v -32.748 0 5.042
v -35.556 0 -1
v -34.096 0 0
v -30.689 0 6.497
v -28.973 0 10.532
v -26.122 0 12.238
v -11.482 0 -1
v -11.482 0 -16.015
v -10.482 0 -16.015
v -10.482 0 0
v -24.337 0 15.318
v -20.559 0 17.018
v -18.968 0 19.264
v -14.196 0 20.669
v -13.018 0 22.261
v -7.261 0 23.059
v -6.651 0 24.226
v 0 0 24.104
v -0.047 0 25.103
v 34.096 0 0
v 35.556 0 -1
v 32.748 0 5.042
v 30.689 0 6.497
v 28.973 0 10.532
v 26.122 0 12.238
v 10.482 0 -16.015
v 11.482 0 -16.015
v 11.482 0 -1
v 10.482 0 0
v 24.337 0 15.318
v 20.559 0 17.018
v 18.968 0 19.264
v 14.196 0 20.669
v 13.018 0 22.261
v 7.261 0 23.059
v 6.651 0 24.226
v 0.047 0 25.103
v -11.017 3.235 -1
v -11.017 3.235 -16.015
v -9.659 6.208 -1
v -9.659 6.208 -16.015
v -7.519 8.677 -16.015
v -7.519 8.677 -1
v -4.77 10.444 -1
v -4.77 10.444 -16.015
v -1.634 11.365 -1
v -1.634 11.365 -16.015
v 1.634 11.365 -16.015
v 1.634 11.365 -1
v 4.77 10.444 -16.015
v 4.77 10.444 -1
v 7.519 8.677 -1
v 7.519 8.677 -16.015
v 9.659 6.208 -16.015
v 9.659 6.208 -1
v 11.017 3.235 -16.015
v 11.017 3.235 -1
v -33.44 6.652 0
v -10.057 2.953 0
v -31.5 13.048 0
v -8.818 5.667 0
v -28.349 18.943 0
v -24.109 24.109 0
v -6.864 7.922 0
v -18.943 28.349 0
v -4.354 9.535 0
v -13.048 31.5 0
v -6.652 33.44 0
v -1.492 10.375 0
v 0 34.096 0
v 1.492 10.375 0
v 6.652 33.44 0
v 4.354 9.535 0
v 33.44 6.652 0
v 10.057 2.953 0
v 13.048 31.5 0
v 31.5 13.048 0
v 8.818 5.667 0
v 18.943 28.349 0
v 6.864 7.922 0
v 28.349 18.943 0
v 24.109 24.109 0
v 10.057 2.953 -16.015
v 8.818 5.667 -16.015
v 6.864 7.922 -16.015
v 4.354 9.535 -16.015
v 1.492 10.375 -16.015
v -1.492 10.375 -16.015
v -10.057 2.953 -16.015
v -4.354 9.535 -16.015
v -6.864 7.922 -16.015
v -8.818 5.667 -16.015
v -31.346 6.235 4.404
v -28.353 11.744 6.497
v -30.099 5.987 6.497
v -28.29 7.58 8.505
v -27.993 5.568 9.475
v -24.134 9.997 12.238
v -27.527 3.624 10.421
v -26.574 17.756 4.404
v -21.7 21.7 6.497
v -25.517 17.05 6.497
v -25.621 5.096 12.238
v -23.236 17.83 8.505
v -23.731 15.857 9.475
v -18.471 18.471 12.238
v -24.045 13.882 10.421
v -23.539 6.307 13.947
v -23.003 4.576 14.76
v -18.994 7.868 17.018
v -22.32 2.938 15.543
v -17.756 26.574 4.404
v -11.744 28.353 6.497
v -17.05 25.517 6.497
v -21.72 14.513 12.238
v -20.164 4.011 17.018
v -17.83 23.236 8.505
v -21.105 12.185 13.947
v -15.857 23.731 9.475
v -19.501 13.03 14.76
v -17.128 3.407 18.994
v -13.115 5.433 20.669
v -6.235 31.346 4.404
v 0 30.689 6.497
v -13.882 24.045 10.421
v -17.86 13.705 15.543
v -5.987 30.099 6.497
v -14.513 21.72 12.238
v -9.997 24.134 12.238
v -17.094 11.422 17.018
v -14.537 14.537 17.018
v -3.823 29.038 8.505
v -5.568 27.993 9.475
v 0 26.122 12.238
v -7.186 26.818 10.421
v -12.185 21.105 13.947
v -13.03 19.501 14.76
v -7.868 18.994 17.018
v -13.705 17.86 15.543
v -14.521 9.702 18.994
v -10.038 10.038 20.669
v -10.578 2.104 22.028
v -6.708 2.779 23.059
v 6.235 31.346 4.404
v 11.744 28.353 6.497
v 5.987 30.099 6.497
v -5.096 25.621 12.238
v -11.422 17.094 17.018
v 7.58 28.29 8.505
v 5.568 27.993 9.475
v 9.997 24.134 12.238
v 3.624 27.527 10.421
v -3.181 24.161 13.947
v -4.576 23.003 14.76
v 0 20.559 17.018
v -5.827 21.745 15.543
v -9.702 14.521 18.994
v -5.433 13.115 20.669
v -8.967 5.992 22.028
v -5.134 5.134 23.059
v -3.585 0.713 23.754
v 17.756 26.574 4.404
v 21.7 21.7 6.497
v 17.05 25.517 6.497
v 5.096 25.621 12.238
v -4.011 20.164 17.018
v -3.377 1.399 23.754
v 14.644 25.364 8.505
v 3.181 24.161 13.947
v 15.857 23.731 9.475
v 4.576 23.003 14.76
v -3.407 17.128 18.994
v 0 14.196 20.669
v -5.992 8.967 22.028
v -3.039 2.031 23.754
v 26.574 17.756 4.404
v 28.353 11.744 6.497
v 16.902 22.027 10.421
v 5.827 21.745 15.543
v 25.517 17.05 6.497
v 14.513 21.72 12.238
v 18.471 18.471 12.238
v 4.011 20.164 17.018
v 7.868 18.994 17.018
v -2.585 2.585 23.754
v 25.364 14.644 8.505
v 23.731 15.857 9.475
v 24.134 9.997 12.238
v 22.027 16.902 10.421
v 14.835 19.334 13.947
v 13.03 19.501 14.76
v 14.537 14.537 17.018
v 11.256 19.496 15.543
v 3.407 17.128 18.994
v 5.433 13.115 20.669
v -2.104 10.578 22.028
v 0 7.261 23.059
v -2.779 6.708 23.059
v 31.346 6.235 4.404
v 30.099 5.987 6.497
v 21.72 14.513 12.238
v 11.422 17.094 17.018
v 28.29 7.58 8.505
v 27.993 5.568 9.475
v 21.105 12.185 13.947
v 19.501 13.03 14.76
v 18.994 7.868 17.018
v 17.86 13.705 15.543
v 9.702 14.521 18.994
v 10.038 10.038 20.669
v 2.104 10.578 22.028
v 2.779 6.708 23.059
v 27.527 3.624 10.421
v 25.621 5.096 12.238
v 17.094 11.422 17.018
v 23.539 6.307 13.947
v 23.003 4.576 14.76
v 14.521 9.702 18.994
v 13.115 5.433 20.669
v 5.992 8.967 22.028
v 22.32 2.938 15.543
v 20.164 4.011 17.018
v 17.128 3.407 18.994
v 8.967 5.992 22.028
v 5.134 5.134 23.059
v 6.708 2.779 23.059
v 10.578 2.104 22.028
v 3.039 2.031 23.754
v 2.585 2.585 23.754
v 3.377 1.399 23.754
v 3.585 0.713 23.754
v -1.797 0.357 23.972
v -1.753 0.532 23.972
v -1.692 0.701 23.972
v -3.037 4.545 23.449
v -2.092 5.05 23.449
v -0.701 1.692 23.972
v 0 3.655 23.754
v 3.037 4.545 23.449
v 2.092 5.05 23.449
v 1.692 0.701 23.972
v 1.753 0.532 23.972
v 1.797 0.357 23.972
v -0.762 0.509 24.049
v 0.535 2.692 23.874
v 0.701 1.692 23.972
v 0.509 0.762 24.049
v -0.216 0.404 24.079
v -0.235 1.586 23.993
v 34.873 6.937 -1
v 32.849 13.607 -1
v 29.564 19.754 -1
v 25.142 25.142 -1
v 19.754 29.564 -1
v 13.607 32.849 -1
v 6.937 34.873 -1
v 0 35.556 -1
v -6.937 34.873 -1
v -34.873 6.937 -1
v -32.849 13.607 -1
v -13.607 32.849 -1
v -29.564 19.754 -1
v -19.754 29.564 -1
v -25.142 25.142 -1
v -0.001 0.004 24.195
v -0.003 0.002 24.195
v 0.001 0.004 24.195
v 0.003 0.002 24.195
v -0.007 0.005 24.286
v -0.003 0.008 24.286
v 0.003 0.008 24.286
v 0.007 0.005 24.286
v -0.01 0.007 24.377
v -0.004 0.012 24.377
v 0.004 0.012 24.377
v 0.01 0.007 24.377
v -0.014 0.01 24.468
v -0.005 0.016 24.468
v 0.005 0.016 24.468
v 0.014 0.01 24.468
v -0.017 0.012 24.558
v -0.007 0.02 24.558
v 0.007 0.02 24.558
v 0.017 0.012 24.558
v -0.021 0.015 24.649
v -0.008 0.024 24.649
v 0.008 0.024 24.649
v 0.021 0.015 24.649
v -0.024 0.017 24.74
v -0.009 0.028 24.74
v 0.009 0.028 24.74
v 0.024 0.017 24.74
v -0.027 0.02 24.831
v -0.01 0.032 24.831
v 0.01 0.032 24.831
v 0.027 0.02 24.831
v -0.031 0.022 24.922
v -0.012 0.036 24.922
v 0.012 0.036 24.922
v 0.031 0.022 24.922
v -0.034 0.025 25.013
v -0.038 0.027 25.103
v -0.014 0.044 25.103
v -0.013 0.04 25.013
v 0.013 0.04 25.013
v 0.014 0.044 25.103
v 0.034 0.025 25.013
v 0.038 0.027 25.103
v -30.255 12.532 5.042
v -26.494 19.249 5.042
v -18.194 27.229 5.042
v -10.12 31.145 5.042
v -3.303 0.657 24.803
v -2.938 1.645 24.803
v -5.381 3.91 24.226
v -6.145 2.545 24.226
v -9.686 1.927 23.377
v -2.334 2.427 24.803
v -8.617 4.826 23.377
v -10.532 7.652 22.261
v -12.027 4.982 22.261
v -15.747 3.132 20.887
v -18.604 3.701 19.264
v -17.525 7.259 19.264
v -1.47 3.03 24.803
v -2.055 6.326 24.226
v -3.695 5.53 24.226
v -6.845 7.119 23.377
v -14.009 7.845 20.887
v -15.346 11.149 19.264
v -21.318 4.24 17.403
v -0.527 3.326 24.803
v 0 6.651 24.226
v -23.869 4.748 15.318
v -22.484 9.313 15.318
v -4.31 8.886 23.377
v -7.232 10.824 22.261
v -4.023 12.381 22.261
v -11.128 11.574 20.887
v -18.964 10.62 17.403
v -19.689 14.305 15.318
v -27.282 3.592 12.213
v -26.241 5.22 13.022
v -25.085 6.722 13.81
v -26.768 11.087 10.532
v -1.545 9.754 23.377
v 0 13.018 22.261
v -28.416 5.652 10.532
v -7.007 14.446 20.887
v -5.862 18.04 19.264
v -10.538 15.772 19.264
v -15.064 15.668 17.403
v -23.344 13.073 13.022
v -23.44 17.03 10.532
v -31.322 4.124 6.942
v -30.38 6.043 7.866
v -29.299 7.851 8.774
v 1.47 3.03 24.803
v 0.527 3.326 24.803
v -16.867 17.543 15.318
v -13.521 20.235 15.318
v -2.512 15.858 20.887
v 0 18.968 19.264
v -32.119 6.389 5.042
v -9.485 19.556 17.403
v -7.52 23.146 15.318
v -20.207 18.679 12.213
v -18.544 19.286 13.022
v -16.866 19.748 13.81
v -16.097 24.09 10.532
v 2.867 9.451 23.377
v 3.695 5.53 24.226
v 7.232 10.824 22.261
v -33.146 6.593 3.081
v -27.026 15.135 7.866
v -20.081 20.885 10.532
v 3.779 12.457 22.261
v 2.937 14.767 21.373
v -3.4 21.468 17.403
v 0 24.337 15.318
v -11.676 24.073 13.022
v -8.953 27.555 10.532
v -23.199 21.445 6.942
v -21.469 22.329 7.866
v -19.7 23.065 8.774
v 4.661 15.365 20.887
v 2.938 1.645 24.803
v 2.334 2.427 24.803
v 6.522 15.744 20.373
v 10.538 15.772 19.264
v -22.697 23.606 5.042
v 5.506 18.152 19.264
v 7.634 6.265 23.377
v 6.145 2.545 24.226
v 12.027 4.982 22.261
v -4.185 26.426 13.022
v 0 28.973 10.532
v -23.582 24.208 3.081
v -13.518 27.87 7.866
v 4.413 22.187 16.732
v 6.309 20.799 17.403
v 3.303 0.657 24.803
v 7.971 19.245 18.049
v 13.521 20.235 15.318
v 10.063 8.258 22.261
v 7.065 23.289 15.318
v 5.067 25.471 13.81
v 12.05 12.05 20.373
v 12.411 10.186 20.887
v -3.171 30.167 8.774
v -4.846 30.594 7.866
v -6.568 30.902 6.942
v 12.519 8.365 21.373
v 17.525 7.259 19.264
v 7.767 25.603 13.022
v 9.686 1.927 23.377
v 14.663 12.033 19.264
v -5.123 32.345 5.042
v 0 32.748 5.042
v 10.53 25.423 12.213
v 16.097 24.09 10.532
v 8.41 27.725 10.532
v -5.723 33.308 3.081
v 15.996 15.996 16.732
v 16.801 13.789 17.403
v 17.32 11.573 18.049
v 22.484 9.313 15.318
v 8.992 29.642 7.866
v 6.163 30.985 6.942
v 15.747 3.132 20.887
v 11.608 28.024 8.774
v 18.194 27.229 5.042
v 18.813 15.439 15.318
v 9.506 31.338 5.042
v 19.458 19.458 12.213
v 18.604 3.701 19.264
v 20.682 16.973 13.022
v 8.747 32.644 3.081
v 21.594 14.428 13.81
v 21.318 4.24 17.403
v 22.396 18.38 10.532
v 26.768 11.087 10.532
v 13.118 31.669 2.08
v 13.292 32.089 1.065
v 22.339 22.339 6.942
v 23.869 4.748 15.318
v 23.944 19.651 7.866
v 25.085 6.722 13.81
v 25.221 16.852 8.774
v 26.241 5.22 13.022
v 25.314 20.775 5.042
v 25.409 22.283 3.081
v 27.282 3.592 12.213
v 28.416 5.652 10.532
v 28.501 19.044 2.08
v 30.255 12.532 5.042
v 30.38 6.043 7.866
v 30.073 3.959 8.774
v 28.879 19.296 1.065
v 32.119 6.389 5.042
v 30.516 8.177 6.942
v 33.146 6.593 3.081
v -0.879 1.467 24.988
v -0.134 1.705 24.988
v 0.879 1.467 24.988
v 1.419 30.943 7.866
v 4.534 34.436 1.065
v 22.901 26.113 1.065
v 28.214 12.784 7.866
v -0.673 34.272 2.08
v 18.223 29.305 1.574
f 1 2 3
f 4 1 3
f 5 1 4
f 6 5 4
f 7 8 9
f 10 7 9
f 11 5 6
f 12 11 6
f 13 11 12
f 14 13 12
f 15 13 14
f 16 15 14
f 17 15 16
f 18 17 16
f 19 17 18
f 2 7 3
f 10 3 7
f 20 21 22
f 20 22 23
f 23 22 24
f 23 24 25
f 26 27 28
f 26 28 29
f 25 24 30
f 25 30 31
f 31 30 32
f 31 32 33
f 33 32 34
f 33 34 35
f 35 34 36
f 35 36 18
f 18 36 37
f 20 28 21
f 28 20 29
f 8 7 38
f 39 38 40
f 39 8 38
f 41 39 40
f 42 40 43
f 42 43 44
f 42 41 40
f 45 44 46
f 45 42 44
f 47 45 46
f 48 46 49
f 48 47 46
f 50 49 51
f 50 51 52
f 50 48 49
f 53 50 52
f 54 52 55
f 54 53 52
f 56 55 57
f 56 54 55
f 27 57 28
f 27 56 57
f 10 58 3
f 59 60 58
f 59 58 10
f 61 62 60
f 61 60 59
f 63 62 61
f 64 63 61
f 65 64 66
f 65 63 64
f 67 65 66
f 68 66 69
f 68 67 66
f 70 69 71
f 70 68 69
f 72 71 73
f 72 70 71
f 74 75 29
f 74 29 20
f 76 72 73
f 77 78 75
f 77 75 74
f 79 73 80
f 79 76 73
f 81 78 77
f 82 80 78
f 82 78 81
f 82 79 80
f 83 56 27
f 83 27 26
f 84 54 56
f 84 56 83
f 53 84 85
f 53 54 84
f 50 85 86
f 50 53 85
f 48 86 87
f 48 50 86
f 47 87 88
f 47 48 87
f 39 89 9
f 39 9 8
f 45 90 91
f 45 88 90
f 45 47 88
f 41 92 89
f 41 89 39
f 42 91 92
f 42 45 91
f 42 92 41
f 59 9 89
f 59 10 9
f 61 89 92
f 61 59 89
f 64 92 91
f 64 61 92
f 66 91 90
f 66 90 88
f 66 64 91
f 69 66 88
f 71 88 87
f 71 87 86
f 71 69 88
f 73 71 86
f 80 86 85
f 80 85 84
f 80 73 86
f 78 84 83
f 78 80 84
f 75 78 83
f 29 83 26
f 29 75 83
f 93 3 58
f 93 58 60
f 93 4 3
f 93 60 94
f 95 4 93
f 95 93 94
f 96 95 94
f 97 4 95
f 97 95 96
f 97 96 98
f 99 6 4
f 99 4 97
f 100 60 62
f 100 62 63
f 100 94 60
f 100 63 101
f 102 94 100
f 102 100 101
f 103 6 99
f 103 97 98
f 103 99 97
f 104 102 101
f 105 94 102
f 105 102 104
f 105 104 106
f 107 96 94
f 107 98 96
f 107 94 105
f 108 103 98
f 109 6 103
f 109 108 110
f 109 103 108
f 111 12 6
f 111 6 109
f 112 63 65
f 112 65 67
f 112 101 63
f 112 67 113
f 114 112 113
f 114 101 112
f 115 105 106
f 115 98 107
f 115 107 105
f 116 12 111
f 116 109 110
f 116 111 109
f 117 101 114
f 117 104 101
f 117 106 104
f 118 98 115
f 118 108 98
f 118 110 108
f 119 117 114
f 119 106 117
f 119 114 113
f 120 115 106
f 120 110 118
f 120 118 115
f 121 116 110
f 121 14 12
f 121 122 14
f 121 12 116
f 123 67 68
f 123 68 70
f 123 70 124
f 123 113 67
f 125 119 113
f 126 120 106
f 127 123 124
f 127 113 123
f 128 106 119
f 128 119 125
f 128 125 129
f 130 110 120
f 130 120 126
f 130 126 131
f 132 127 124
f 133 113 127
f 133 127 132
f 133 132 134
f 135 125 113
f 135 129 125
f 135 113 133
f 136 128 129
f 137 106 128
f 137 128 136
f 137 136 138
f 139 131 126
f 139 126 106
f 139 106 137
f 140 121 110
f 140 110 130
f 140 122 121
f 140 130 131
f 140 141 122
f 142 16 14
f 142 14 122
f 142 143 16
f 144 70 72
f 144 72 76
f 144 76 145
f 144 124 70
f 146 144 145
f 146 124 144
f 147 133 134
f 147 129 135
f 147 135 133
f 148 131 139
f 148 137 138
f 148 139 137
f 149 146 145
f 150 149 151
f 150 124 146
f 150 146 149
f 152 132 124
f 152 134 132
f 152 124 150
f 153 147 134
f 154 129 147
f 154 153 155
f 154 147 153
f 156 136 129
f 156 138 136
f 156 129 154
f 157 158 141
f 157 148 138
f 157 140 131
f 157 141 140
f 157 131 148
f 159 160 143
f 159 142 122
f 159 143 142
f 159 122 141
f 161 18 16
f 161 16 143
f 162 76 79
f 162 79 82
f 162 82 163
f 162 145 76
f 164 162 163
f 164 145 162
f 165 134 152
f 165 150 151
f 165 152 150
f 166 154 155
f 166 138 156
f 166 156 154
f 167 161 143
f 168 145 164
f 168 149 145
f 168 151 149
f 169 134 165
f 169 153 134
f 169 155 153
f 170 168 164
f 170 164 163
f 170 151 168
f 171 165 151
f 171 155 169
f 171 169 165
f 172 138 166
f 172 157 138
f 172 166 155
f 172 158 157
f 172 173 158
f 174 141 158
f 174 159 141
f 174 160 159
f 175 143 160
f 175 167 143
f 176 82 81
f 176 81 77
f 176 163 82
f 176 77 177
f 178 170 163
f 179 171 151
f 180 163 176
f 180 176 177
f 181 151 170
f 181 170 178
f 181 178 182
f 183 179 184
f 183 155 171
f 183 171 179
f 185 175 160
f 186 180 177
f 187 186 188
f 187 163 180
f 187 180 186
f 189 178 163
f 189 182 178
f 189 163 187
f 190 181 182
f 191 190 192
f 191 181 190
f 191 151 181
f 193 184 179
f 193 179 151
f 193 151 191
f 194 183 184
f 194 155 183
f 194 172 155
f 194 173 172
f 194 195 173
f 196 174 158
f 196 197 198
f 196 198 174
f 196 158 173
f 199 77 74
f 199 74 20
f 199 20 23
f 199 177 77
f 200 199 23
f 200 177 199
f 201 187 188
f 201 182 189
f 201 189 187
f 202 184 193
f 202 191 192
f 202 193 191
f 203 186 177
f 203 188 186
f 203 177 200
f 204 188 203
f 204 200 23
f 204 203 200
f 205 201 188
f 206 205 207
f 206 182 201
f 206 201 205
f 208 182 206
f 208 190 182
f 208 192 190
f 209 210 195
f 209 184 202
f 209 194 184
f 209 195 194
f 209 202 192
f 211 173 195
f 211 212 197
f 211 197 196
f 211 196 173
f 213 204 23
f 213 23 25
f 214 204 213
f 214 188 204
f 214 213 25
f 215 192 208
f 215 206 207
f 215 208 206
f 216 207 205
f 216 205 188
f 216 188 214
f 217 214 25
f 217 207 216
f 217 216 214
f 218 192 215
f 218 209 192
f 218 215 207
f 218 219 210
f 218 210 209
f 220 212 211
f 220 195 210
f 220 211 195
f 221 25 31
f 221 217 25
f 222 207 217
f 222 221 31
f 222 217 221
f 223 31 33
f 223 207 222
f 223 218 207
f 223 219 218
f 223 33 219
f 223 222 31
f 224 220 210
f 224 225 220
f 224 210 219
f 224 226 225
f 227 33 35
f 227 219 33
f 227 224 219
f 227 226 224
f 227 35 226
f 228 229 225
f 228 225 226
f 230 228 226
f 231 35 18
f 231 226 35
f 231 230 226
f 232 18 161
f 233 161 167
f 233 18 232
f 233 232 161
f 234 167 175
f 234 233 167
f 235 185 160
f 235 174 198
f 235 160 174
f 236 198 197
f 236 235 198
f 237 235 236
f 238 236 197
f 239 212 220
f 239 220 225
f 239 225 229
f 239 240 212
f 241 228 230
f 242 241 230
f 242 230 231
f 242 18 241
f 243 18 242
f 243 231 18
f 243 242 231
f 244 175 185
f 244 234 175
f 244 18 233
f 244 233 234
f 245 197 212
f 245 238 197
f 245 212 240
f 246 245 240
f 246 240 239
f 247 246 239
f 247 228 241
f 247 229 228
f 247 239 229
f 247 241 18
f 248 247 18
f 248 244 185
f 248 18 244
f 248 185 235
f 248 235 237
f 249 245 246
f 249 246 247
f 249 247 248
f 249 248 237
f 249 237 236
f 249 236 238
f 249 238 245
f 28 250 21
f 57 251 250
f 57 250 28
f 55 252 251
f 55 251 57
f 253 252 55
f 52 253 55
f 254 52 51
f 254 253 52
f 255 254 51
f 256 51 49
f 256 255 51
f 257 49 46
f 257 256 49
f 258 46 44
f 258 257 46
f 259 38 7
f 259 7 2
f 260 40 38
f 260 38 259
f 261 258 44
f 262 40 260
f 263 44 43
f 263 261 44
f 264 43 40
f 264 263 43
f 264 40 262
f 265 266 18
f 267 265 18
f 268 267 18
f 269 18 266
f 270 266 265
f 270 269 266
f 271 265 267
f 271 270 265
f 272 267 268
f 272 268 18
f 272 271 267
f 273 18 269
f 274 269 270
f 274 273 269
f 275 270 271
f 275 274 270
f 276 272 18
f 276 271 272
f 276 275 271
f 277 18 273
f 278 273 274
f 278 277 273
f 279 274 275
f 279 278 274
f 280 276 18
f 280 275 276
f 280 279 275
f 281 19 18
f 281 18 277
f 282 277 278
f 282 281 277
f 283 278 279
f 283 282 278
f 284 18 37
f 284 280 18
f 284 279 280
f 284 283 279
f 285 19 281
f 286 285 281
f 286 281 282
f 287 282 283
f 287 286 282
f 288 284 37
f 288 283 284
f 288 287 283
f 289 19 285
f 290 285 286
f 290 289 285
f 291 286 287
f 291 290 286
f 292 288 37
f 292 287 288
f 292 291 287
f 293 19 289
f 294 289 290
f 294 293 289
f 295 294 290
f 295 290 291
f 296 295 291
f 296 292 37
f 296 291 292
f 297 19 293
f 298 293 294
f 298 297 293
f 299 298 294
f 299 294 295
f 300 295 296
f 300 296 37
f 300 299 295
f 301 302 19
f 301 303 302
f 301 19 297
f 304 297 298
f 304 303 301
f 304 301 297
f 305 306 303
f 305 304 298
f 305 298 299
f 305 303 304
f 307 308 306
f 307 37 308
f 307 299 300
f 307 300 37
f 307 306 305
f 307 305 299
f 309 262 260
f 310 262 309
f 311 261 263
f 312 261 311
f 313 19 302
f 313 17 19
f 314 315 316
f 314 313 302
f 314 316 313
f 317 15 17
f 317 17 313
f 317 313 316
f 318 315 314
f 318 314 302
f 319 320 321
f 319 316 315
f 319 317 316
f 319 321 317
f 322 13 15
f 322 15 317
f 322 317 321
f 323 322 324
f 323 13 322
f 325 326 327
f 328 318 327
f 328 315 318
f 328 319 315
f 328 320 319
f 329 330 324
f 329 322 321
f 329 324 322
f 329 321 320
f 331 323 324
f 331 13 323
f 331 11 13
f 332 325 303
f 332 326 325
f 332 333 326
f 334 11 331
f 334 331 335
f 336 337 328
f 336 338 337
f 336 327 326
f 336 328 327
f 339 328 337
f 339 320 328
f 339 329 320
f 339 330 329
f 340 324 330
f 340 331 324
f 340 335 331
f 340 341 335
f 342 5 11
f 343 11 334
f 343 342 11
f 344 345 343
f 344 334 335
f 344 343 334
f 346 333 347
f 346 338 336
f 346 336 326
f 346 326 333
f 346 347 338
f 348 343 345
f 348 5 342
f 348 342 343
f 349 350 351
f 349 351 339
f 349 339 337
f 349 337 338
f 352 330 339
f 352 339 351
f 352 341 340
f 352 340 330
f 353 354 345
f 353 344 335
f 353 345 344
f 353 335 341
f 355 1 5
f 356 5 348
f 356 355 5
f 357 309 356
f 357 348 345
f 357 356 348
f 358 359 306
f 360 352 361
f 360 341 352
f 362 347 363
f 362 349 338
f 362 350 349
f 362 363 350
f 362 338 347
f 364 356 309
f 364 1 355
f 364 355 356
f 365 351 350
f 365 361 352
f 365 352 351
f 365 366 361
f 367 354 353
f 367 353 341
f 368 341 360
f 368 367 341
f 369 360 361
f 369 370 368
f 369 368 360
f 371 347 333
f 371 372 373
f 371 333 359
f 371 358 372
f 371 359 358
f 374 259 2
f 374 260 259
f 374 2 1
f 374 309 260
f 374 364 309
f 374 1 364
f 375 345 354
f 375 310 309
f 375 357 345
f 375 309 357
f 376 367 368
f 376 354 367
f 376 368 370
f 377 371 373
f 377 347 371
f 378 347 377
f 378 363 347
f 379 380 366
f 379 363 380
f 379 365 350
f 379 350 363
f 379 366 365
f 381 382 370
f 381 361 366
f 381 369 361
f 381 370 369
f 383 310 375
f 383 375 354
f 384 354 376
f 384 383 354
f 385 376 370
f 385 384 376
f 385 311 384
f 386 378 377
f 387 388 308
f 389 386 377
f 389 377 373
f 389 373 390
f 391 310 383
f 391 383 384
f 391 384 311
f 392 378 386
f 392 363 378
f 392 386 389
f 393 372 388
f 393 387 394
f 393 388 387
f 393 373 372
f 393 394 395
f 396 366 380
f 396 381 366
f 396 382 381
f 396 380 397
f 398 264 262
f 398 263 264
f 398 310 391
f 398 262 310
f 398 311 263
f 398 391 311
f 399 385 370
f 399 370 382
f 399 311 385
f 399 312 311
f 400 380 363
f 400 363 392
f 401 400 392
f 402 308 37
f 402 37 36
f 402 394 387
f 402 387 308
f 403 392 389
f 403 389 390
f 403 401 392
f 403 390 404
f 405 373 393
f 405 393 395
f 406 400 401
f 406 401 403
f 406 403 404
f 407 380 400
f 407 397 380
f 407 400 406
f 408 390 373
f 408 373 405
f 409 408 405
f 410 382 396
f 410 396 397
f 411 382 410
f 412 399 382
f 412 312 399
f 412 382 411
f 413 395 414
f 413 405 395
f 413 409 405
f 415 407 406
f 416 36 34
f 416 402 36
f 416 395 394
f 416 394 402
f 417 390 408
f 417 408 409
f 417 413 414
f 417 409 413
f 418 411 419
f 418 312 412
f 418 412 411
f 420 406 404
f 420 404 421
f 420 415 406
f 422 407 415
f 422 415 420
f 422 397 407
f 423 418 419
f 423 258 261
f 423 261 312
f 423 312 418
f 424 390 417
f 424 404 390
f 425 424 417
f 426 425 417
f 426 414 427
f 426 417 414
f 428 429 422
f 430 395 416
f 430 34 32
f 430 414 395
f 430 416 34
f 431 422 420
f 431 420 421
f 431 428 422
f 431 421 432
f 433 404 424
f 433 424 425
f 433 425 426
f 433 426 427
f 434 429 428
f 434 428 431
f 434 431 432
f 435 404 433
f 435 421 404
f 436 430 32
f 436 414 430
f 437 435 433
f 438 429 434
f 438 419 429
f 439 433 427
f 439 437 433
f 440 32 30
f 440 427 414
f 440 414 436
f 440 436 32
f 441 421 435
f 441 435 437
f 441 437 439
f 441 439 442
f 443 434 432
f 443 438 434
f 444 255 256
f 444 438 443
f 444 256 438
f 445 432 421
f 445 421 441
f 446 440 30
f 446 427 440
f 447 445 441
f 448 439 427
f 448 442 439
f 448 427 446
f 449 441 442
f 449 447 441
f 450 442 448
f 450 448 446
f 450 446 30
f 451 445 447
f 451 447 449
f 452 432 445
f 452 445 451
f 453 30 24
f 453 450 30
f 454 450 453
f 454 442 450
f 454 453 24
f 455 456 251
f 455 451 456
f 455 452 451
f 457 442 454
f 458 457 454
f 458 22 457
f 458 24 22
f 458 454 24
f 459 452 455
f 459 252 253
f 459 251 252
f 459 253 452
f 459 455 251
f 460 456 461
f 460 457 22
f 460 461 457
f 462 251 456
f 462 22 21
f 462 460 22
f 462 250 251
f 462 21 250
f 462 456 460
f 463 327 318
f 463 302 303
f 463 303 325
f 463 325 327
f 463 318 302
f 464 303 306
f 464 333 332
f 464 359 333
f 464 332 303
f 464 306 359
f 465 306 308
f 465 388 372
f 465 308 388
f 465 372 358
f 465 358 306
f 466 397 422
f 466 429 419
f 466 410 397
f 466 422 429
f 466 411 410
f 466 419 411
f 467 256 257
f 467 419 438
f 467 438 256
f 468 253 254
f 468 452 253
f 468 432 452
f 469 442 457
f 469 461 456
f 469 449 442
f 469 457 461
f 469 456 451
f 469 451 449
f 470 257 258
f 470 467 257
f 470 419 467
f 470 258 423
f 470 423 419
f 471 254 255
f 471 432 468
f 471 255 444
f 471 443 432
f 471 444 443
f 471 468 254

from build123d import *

# Parameters (mm, degrees)
F1_ANGLE = 180


with BuildPart() as f1:
    # F0 (on Front) → F1 (revolve)
    with BuildSketch(Plane.XZ):
        with BuildLine():
            ThreePointArc((-34.095638, 0), (-20.558778, 17.018454), (0, 24.104428))
            Line((0, 24.104428), (-0.046644, 25.103341))
            ThreePointArc((-0.046644, 25.103341), (-21.735137, 17.403096), (-35.555795, -1))
            Line((-35.555795, -1), (-11.48195, -1))
            Line((-11.48195, -1), (-11.48195, -16.015298))
            Line((-11.48195, -16.015298), (-10.48195, -16.015298))
            Line((-10.48195, -16.015298), (-10.48195, 0))
            Line((-10.48195, 0), (-34.095638, 0))
        make_face()
    revolve(axis=Axis((0, 0, 5.296746), (0, 0, -1)), revolution_arc=F1_ANGLE)


solid = f1.part
